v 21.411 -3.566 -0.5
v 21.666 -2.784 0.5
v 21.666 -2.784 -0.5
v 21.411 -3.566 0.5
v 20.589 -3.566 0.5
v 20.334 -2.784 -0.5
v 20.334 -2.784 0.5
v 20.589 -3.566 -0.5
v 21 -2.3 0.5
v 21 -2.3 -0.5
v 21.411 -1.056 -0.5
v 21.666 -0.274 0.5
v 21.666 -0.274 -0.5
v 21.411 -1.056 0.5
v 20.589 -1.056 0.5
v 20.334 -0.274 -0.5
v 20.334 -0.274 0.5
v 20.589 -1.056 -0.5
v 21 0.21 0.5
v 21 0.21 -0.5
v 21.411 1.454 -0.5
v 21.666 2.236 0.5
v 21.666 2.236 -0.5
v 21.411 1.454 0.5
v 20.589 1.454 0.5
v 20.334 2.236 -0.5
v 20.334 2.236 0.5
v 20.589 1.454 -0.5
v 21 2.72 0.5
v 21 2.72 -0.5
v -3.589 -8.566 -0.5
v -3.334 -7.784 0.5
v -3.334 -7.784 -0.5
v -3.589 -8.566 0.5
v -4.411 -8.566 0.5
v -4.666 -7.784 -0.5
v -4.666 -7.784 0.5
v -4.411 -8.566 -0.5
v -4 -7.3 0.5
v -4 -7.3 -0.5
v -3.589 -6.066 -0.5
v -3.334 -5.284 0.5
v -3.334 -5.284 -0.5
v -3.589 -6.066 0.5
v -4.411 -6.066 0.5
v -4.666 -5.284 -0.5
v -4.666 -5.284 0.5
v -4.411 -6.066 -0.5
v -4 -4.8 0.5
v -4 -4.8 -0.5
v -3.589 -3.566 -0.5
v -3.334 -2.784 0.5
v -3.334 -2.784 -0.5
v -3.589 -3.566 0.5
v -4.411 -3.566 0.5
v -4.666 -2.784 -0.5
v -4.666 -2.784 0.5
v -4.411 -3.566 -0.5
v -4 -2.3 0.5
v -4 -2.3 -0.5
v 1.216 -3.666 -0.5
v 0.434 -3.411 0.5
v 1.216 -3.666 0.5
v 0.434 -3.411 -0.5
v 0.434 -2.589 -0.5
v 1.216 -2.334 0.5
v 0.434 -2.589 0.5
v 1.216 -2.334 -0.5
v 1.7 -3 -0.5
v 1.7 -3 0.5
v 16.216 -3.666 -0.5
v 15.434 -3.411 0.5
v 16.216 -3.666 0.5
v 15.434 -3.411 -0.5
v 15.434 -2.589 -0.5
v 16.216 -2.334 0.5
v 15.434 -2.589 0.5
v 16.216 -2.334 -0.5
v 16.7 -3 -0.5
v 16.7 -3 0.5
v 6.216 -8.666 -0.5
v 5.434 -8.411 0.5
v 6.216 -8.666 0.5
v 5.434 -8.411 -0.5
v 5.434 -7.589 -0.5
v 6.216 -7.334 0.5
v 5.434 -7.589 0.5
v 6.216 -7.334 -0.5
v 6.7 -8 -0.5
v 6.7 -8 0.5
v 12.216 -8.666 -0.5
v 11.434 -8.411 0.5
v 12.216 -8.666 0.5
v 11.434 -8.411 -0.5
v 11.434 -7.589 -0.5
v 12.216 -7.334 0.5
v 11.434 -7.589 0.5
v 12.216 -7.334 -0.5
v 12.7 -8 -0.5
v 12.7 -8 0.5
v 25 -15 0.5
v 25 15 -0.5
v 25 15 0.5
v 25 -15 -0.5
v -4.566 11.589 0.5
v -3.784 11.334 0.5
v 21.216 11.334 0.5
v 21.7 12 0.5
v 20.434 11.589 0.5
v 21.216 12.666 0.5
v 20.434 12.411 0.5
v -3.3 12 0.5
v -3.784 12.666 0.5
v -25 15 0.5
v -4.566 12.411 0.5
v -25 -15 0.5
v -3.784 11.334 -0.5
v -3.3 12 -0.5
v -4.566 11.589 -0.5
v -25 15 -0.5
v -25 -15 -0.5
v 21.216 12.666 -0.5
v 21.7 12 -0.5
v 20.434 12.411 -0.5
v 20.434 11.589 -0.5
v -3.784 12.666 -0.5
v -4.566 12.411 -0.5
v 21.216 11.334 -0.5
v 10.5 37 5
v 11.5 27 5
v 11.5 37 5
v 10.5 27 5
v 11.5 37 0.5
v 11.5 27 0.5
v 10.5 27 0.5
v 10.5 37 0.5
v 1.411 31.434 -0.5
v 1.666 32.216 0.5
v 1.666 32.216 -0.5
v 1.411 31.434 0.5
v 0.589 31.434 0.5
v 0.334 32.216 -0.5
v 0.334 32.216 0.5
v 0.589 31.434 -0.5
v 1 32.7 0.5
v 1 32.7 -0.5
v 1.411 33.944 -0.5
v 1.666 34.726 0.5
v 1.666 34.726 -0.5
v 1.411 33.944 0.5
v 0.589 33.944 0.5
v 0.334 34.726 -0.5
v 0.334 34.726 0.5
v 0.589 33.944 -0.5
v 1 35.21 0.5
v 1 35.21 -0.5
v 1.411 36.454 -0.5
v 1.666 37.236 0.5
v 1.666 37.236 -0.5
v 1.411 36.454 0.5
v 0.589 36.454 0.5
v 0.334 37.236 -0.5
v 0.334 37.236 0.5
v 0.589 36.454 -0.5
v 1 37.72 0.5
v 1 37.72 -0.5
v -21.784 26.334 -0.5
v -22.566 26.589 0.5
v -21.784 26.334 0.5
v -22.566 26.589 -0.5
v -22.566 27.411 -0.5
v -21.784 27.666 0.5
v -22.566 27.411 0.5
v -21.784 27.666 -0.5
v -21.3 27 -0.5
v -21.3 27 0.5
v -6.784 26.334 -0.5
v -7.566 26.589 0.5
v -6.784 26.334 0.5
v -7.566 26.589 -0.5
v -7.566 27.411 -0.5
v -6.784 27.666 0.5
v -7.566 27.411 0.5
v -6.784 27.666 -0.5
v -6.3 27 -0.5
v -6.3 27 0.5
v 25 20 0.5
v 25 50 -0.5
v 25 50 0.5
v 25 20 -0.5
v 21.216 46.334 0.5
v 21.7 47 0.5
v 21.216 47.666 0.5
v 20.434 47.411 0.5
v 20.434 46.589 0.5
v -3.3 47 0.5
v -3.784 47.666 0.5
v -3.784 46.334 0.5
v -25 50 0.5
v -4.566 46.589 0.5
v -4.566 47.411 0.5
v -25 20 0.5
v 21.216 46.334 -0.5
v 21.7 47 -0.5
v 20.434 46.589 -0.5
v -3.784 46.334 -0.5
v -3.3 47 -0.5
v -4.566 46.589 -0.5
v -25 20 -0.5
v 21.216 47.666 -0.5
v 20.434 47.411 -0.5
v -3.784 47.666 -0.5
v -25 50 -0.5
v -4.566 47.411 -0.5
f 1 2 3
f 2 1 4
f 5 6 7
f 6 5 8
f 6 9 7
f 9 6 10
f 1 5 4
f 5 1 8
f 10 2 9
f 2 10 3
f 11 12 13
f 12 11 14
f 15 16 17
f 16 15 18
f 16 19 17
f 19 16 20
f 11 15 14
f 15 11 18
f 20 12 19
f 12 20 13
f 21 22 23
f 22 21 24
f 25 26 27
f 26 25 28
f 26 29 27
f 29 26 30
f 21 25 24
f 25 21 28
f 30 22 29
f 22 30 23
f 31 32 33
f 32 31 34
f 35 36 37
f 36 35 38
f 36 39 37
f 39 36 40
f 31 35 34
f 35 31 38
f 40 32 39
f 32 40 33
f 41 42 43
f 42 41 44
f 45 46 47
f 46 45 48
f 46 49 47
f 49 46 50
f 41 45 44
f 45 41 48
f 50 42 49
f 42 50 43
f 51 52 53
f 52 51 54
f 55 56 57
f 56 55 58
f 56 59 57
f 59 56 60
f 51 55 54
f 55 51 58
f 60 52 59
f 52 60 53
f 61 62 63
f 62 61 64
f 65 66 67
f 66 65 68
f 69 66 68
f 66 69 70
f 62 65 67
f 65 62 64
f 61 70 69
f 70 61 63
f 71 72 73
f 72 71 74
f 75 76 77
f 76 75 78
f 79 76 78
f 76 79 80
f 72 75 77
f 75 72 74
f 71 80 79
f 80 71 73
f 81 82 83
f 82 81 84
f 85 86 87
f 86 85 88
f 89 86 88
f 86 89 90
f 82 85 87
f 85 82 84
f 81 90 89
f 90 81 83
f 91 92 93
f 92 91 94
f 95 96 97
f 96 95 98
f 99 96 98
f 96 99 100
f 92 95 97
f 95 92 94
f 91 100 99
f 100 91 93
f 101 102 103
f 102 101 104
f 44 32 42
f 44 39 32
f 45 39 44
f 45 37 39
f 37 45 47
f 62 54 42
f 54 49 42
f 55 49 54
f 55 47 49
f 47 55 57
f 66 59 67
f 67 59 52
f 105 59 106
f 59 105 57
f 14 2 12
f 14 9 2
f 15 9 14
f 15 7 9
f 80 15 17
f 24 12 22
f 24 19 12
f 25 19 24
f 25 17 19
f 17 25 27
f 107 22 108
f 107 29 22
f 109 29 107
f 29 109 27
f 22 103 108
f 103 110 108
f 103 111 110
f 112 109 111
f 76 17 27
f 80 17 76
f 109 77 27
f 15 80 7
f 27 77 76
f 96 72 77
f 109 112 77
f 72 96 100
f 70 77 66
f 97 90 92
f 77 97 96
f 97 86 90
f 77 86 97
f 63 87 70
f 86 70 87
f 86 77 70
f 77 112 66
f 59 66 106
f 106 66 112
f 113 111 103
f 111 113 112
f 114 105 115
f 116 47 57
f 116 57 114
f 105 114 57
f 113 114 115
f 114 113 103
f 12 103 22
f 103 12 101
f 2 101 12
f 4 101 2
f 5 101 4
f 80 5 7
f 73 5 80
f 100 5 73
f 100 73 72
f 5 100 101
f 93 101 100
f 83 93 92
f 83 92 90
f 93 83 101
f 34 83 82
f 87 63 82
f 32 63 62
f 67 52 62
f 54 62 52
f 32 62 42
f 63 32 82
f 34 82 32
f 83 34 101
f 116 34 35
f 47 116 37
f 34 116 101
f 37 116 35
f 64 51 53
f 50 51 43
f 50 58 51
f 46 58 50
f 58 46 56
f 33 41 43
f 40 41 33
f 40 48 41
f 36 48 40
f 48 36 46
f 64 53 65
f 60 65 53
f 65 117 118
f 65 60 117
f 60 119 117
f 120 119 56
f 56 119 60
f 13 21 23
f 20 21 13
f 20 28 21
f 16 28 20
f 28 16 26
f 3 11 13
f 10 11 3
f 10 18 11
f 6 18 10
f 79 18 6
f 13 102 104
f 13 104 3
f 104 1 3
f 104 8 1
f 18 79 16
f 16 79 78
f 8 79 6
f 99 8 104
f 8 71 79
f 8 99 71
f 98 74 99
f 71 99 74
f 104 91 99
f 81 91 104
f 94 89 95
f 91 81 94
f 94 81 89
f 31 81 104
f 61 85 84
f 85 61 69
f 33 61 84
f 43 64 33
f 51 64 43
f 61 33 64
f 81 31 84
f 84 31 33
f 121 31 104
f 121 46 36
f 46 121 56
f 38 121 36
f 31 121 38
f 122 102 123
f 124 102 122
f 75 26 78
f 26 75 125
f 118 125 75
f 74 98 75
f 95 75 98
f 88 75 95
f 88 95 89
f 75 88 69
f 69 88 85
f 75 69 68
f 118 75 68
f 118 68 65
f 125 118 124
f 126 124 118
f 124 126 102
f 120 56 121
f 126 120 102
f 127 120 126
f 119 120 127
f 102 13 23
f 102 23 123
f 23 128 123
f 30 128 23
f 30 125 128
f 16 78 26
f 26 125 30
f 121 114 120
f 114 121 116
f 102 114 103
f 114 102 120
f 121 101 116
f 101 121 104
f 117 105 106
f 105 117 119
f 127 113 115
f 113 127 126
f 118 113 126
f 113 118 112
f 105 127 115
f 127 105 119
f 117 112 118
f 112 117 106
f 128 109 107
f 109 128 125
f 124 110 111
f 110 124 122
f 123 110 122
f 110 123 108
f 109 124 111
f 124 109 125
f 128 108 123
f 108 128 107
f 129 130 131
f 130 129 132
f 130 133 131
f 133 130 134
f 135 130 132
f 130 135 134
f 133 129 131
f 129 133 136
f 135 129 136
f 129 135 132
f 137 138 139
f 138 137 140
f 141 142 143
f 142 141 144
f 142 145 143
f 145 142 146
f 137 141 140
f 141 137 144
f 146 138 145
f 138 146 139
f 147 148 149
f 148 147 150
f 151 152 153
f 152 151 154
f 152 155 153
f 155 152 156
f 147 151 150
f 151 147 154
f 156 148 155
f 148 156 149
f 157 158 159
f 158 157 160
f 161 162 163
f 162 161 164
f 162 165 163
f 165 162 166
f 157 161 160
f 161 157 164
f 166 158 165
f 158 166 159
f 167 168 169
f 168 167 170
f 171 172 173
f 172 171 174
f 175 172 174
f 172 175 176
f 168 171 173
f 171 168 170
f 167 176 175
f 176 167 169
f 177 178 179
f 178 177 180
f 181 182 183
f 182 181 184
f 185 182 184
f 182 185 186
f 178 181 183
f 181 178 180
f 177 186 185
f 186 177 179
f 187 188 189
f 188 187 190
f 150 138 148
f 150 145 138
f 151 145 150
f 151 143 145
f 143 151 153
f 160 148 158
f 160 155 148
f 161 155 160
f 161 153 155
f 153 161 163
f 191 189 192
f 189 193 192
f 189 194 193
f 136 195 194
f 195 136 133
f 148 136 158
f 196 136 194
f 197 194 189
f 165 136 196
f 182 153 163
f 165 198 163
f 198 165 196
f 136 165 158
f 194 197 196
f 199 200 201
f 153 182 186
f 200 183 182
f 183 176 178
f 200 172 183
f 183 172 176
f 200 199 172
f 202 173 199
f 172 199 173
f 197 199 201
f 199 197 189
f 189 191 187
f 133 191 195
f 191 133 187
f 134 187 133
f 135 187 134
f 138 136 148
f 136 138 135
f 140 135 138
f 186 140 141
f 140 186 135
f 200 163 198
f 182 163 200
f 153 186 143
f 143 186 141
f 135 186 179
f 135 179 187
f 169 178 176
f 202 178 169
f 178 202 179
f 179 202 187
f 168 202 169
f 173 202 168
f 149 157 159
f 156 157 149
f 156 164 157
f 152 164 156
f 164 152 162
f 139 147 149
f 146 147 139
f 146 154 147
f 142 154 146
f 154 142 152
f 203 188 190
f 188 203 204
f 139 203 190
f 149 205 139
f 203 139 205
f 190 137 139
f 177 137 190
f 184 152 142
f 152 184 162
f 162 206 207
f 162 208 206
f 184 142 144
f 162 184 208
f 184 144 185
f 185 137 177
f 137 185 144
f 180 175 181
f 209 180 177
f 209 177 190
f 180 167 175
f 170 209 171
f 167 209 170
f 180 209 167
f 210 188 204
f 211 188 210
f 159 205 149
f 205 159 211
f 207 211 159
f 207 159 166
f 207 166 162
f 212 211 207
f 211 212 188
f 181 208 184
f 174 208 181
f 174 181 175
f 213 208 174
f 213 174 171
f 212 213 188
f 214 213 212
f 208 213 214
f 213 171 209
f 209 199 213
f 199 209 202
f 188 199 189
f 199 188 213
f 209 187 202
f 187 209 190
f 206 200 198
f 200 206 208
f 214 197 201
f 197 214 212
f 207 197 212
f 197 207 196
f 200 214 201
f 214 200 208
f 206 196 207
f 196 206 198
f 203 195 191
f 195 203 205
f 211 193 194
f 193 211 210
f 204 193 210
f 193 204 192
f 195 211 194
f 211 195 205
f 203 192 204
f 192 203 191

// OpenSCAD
	r1=0.7;
	transistorSpacing=2.5;
	module pin(x,y){
		translate([x, y, 0])
		cylinder(r = r1, h = 5,center=true);

	}	
module transistor(x, y,r) {

		translate([x, y, 0]){
		rotate(90, r){
		cylinder(r = r1, h = 5,center=true);

		translate([transistorSpacing, 0, 0])
		cylinder(r = r1, h = 5,center=true);


		translate([transistorSpacing*2, 0, 0])
		cylinder(r = r1, h = 5,center=true);
}}

	}
	module 78LO(x, y,r) {
		translate([x, y, 0]){
		rotate(90, r){
		cylinder(r = r1, h = 5,center=true);
		translate([transistorSpacing, 0, 0])
		cylinder(r = r1, h = 5,center=true);

		translate([transistorSpacing*2, 0, 0])
		cylinder(r = r1, h = 5,center=true);
		}}
	}
	module diode(x,y,r){
		translate([x, y, 0]){
		rotate(90, r){
		
		cylinder(r = r1, h = 5,center=true);
		
		translate([15, 0, 0])
		cylinder(r = r1, h = 5,center=true);
		}}
	}

	module motor(x,y,r){

		translate([x, y, 0]){
		rotate(90, r){
		cylinder(r = r1, h = 5,center=true);
		
		translate([6, 0, 0])
		cylinder(r = r1, h = 5,center=true);
		}}
	}
	module resistor(x,y,r){

		translate([x, y, 0]){
		rotate(90, r){
		cylinder(r = r1, h = 5,center=true);
		
		translate([15, 0, 0])
		cylinder(r = r1, h = 5,center=true);
		}
		}
	}
	module LM317(x, y,r) {
		translate([x, y, 0]){
		rotate(90, r){
		cylinder(r = r1, h = 5,center=true);
		translate([transistorSpacing+0.01, 0, 0])
		cylinder(r = r1, h = 5,center=true);

		translate([(transistorSpacing+0.01)*2, 0, 0])
		cylinder(r = r1, h = 5,center=true);
		}}
	}
	module potentiometer(x, y,r) {
		translate([x, y, 0]){
		rotate(90, r){
		difference()
{
			rotate(a=[0,0,90]){
				translate([0,0,2.5])
					cube([1, 10, 5],center=true);
		}
rotate(a=[90,0,0]){translate([-2.5,-2.5,0]){
				cylinder(r = r1, h = 5,center=true);
				translate([transistorSpacing+0.01, 0, 0])
					cylinder(r = r1, h = 5,center=true);

				translate([(transistorSpacing+0.01)*2, 0, 0])
					cylinder(r = r1, h = 5,center=true);
			}}
		}}
		}
	}
module motorControl()
{

	function x(d) = d-24;
	function y(d) = d-33;
	difference() {
		cube([50, 30, 1], center =true);
		//78LO(x(45),y(30),[0, 0, 1]);
		LM317(x(45),y(30),[0, 0, 1])
		resistor(x(2),y(25),[0,0,0]);
		transistor(x(20),y(25),[0, 0, 1]);
		//ground
		pin(x(20),y(45));
		diode(x(25),y(30),[0, 0, 0]);
		//VCC
		pin(x(45),y(45));
		motor(x(30),y(25),[0,0,0]);
	}
}

module powerSupply()
{

	
	function x(d) = d-24;
	function y(d) = d-33;
	
translate([0,35,0]){
potentiometer(x(35),y(30),[0, 0, 1]);
	difference() {
		cube([50, 30, 1], center =true);
		//78LO(x(45),y(30),[0, 0, 1]);
		LM317(x(25),y(30),[0, 0, 1]);
		resistor(x(2),y(25),[0,0,0]);
		//transistor(x(20),y(25),[0, 0, 1]);
		//ground
		pin(x(20),y(45));
		//diode(x(25),y(30),[0, 0, 0]);
		//VCC
		pin(x(45),y(45));
		//motor(x(30),y(25),[0,0,0]);
	}
	}
}
motorControl();

powerSupply();
